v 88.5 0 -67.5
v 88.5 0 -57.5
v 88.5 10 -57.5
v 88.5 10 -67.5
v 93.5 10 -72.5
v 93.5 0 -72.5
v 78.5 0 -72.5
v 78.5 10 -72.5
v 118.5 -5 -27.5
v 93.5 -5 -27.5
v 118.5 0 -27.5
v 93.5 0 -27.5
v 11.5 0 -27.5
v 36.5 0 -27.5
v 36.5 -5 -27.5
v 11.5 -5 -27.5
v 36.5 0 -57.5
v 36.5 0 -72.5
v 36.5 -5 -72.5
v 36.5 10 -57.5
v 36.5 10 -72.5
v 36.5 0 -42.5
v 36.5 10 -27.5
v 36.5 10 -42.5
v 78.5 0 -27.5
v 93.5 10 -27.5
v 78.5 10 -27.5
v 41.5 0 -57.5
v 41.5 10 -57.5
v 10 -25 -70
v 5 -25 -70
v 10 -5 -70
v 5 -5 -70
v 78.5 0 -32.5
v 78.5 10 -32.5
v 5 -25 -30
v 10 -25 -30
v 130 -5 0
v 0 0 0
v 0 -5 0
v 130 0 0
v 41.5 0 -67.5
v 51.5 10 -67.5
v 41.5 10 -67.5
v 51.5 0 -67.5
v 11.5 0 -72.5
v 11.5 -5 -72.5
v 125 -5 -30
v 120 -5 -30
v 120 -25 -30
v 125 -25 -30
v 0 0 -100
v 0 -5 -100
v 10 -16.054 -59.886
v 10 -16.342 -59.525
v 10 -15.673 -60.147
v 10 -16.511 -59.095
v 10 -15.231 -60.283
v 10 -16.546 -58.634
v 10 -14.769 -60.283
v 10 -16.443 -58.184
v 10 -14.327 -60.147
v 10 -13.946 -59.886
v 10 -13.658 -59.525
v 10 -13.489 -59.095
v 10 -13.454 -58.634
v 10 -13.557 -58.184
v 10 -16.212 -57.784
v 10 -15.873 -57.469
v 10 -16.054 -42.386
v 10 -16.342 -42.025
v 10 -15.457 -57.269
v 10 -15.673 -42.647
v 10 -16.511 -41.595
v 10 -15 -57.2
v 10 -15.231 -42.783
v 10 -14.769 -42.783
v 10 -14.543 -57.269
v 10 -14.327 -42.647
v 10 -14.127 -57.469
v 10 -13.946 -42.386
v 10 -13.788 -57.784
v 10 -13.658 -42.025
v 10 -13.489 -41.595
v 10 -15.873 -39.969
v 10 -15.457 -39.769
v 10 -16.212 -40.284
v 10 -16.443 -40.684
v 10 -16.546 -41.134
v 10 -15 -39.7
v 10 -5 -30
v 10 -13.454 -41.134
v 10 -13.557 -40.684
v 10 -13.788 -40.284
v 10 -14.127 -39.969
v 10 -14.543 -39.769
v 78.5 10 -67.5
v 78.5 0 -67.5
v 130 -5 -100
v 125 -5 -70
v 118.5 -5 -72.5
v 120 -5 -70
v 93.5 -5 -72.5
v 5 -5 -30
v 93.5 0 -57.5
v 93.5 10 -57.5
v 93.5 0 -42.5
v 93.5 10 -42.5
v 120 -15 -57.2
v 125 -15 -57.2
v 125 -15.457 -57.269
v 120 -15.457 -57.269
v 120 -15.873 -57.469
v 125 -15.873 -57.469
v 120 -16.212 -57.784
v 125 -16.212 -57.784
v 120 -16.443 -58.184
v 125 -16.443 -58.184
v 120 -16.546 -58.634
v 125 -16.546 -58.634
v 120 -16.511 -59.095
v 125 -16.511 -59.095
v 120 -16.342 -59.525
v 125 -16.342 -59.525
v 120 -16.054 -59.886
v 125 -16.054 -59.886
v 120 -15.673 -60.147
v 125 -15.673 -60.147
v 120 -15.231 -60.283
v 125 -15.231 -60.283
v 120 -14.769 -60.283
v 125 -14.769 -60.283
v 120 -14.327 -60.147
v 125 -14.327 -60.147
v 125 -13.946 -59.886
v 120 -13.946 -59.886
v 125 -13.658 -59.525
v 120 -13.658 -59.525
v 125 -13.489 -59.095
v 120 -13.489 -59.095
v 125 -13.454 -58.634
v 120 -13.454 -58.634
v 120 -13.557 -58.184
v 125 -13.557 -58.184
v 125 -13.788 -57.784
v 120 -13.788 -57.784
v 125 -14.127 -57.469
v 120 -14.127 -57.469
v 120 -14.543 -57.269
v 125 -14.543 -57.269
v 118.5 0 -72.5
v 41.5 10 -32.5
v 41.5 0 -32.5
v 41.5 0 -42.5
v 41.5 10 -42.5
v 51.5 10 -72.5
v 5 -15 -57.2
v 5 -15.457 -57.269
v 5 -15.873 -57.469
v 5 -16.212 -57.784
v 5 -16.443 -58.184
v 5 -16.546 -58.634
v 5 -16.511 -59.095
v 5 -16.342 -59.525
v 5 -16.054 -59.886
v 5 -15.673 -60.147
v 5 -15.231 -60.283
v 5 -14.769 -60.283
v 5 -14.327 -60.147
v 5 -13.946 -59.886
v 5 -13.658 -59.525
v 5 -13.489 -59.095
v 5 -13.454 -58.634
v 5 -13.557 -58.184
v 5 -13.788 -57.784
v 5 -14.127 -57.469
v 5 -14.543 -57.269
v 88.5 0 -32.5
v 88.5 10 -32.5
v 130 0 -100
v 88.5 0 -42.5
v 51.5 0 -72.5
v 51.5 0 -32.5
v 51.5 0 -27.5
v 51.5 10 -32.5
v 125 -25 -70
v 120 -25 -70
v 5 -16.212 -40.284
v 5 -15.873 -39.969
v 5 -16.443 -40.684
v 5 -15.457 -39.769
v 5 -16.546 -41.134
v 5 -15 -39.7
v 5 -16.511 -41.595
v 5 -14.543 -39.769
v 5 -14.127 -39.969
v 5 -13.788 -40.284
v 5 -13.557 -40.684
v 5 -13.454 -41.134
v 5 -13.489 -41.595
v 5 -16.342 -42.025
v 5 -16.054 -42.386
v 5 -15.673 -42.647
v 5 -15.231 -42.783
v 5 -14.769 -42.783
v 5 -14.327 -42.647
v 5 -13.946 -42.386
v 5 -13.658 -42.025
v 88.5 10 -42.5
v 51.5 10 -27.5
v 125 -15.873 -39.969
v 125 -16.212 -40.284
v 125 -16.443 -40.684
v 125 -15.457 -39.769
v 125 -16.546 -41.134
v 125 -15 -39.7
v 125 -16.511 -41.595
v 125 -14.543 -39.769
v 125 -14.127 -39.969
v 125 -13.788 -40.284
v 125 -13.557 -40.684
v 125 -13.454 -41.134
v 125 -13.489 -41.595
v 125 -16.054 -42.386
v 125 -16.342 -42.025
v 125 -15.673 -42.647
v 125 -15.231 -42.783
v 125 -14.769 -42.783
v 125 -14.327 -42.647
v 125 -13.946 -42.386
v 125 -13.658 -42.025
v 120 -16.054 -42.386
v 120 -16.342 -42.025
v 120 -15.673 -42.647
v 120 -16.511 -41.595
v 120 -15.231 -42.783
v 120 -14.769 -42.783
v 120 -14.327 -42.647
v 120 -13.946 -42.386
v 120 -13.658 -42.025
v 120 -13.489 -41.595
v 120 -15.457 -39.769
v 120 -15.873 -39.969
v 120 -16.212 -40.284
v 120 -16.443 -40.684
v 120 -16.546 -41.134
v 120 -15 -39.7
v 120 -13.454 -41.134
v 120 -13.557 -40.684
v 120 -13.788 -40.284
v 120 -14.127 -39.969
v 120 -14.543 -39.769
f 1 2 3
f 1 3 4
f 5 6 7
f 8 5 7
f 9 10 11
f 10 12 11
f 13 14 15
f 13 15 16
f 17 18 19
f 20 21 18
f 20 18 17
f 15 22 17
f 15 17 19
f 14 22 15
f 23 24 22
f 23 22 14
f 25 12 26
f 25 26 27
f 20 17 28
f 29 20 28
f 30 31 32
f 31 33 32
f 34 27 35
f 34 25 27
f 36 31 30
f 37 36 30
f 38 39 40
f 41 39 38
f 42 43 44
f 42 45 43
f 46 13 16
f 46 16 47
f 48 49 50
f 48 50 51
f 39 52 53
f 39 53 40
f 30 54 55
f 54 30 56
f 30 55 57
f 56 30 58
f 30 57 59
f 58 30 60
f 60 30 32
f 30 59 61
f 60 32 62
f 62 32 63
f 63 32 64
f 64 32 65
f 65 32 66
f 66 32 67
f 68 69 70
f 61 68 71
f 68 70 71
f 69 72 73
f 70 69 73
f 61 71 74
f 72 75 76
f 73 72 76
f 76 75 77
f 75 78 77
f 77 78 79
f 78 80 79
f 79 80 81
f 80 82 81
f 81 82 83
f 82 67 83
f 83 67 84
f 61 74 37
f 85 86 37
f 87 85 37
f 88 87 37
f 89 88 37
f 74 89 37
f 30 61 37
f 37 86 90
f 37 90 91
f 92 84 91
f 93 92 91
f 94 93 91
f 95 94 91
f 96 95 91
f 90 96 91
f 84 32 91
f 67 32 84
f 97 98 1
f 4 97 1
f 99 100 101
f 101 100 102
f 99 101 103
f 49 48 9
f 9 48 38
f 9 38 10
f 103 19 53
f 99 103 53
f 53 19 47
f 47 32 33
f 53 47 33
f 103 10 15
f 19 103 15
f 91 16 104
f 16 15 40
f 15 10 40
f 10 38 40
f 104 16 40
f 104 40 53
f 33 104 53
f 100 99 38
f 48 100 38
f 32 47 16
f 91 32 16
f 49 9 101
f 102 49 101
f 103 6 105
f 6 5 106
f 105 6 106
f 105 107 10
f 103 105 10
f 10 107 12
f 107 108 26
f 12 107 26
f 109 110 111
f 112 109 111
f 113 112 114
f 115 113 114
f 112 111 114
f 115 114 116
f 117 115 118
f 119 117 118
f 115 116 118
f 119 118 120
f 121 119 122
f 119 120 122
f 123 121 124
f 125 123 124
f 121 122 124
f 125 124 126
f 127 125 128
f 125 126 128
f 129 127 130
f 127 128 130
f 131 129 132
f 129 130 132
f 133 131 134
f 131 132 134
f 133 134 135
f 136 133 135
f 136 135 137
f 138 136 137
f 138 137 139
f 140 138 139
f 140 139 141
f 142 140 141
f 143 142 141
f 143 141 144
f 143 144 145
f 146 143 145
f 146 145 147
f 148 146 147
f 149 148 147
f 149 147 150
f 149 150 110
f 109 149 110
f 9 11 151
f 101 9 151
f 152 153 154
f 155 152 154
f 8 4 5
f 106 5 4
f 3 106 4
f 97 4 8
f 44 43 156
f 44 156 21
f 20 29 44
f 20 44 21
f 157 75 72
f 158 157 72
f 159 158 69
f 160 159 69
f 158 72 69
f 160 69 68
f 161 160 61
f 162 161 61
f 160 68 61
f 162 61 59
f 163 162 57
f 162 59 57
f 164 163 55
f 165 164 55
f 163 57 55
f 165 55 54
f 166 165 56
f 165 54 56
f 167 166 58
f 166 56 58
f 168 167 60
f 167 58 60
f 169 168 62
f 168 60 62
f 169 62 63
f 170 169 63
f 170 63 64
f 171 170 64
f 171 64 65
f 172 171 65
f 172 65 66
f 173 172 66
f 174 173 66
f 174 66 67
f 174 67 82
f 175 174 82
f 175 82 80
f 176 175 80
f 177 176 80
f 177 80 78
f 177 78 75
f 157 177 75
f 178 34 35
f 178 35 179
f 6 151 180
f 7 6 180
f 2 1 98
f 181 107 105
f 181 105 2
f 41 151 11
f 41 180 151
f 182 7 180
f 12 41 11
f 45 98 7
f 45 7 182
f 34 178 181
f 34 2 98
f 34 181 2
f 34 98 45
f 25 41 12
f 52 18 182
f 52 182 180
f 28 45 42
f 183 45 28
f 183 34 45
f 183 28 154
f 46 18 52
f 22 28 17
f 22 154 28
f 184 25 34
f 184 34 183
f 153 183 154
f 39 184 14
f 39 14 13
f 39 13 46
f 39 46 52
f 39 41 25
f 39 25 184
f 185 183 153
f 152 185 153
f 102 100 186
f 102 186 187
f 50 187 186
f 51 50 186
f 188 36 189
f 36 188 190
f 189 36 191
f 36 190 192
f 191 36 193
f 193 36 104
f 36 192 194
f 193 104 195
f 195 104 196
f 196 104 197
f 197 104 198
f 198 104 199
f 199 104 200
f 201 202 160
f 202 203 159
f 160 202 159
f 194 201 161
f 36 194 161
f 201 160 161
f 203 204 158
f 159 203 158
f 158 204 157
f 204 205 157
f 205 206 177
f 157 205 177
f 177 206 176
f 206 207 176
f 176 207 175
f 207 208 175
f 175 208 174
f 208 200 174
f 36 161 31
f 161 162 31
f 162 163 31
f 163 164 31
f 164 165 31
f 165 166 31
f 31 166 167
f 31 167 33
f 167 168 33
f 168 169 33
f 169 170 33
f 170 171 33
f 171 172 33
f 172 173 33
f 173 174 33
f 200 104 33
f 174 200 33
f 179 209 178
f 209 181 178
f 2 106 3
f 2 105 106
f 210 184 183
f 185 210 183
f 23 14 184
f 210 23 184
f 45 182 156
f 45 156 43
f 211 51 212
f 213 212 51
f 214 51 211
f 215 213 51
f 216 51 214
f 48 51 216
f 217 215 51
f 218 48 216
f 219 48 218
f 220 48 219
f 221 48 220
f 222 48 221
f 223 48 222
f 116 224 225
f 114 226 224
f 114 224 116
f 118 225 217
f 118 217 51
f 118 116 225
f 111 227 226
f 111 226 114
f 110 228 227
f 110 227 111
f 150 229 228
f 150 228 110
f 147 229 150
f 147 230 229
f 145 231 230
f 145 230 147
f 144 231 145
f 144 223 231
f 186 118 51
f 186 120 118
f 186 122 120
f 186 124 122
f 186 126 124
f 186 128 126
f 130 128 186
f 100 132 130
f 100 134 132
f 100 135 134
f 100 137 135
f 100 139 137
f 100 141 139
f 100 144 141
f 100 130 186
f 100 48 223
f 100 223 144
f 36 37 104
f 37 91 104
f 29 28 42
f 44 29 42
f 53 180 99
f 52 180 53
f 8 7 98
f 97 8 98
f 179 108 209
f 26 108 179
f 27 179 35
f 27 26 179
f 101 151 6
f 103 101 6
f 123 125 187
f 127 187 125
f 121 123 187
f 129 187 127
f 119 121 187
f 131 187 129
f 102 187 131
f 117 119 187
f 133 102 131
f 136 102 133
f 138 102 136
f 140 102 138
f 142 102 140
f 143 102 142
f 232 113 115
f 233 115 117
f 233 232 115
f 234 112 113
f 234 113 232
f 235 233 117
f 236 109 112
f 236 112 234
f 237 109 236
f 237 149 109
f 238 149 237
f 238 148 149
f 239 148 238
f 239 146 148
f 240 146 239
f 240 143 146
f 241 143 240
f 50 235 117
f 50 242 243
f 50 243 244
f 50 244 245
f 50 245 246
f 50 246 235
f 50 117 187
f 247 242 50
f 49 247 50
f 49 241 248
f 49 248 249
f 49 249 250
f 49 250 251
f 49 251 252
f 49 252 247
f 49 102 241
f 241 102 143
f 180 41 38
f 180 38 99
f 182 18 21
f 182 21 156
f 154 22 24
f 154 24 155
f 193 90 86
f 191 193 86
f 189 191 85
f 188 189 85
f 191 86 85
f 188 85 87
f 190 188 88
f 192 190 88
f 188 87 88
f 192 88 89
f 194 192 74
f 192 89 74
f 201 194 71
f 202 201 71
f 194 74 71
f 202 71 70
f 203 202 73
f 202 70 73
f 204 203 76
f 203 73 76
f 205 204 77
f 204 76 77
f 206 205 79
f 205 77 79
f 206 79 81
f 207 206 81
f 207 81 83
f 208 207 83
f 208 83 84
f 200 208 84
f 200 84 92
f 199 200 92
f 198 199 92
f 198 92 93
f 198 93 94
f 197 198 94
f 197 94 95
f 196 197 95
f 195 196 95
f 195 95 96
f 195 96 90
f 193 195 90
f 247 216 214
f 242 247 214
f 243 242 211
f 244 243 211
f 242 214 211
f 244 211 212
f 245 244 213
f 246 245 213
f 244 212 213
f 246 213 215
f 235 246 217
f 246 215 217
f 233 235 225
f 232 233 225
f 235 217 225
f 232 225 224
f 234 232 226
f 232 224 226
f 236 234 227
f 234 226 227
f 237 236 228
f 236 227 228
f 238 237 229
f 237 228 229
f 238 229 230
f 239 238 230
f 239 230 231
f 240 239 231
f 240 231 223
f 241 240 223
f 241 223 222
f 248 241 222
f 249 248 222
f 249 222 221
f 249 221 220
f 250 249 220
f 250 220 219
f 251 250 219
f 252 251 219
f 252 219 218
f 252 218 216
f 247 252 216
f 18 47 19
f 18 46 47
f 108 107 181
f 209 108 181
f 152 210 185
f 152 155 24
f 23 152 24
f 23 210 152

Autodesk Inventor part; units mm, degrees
ref_plane "YZ Plane" through (0, 0, 0) normal (1, 0, 0) x (0, 1, 0)
ref_plane "XZ Plane" through (0, 0, 0) normal (0, 1, 0) x (-1, 0, 0)
ref_plane "XY Plane" through (0, 0, 0) normal (0, 0, 1) x (1, 0, 0)
sketch "Sketch1" plane through (0, 0, 0) normal (0, 1, 0) x (-1, 0, 0)
  line L0 (0, 0) -> (-130, 0)
  line L1 (-130, 0) -> (-130, -100)
  line L2 (-130, -100) -> (0, -100)
  line L3 (0, -100) -> (0, 0)
  line L4 (-41.5, -67.5) -> (-88.5, -67.5) construction
  line L5 (-88.5, -67.5) -> (-88.5, -32.5) construction
  line L6 (-88.5, -32.5) -> (-41.5, -32.5) construction
  line L7 (-41.5, -32.5) -> (-41.5, -67.5) construction
  line L8 (-41.5, -50) -> (-88.5, -50) construction
  line L9 (-65, -67.5) -> (-65, -32.5) construction
  line L10 (-41.5, -32.5) -> (-41.5, -42.5)
  line L11 (-36.5, -42.5) -> (-41.5, -42.5)
  line L12 (-36.5, -42.5) -> (-36.5, -27.5)
  line L13 (-36.5, -27.5) -> (-51.5, -27.5)
  line L14 (-51.5, -27.5) -> (-51.5, -32.5)
  line L15 (-51.5, -32.5) -> (-41.5, -32.5)
  line L16 (-93.5, -42.5) -> (-88.5, -42.5)
  line L17 (-93.5, -42.5) -> (-93.5, -27.5)
  line L18 (-93.5, -27.5) -> (-78.5, -27.5)
  line L19 (-78.5, -27.5) -> (-78.5, -32.5)
  line L20 (-78.5, -32.5) -> (-88.5, -32.5)
  line L21 (-88.5, -42.5) -> (-88.5, -32.5)
  line L22 (-36.5, -57.5) -> (-41.5, -57.5)
  line L23 (-36.5, -57.5) -> (-36.5, -72.5)
  line L24 (-36.5, -72.5) -> (-51.5, -72.5)
  line L25 (-51.5, -72.5) -> (-51.5, -67.5)
  line L26 (-93.5, -57.5) -> (-88.5, -57.5)
  line L27 (-93.5, -57.5) -> (-93.5, -72.5)
  line L28 (-93.5, -72.5) -> (-78.5, -72.5)
  line L29 (-78.5, -72.5) -> (-78.5, -67.5)
  line L30 (-41.5, -57.5) -> (-41.5, -67.5)
  line L31 (-51.5, -67.5) -> (-41.5, -67.5)
  line L32 (-78.5, -67.5) -> (-88.5, -67.5)
  line L33 (-88.5, -57.5) -> (-88.5, -67.5)
  line L34 (-11.5, -72.5) -> (-36.5, -72.5)
  line L35 (-36.5, -72.5) -> (-36.5, -27.5)
  line L36 (-36.5, -27.5) -> (-11.5, -27.5)
  line L37 (-11.5, -27.5) -> (-11.5, -72.5)
  line L38 (-118.5, -72.5) -> (-93.5, -72.5)
  line L39 (-93.5, -72.5) -> (-93.5, -27.5)
  line L40 (-93.5, -27.5) -> (-118.5, -27.5)
  line L41 (-118.5, -27.5) -> (-118.5, -72.5)
  point P0 (0, -50)
  point P1 (-65, -100)
  point P2 (-24, -72.5)
  point P3 (-24, -57.5)
  point P4 (-24, -27.5)
  dimension "d0" = 130
  dimension "d1" = 100
  dimension "d4" = 47
  dimension "d5" = 35
  dimension "d6" = 5
  dimension "d7" = 5
  dimension "d8" = 10
  dimension "d9" = 10
  dimension "d26" = 25
  dimension "d27" = 0
extrude "Extrusion1" add sketch "Sketch1" against normal blind 5 contours L3 L2 L1 L0 | L15 L14 L13 L12 L11 L10 | L23 L24 L25 L31 L30 L22 | L17 L18 L19 L20 L21 L16 | L26 L33 L32 L29 L28 L27
extrude "Extrusion2" add sketch "Sketch1" along normal blind 10 contours L15 L14 L13 L12 L11 L10 | L23 L24 L25 L31 L30 L22 | L17 L18 L19 L20 L21 L16 | L26 L33 L32 L29 L28 L27
sketch "Sketch2" plane through (0, -5, 0) normal (0, -1, 0) x (1, 0, 0)
  line L0 (120, -30) -> (125, -30)
  line L1 (125, -30) -> (125, -70)
  line L2 (125, -70) -> (120, -70)
  line L3 (120, -70) -> (120, -30)
  line L4 (130, -100) -> (130, 0) projected
  line L5 (0, 0) -> (130, 0) projected
  line L6 (65, 0) -> (65, -100) construction
  line L7 (130, -100) -> (0, -100) projected
  line L8 (10, -30) -> (5, -30)
  line L9 (5, -30) -> (5, -70)
  line L10 (5, -70) -> (10, -70)
  line L11 (10, -70) -> (10, -30)
  point P0 (125, -50)
  point P1 (130, -50)
  dimension "d12" = 5
  dimension "d13" = 40
  dimension "d14" = 5
extrude "Extrusion3" add sketch "Sketch2" along normal blind 20
sketch "Sketch3" plane through (5, -5, -70) normal (-1, 0, 0) x (0, 0, 1)
  line L0 (11.25, -10) -> (28.75, -10) construction
  line L1 (70, 0) -> (-30, 0) projected
  point P0 (70, 5)
  point P1 (20, 0)
  point P2 (20, -10)
  dimension "d17" = 17.5
  dimension "d18" = 10
hole "Hole1" at (5, -15, -41.25) at (5, -15, -58.75) direction (1, 0, 0) diameter 3.1 end through all
properties part number "Chasis 3"
